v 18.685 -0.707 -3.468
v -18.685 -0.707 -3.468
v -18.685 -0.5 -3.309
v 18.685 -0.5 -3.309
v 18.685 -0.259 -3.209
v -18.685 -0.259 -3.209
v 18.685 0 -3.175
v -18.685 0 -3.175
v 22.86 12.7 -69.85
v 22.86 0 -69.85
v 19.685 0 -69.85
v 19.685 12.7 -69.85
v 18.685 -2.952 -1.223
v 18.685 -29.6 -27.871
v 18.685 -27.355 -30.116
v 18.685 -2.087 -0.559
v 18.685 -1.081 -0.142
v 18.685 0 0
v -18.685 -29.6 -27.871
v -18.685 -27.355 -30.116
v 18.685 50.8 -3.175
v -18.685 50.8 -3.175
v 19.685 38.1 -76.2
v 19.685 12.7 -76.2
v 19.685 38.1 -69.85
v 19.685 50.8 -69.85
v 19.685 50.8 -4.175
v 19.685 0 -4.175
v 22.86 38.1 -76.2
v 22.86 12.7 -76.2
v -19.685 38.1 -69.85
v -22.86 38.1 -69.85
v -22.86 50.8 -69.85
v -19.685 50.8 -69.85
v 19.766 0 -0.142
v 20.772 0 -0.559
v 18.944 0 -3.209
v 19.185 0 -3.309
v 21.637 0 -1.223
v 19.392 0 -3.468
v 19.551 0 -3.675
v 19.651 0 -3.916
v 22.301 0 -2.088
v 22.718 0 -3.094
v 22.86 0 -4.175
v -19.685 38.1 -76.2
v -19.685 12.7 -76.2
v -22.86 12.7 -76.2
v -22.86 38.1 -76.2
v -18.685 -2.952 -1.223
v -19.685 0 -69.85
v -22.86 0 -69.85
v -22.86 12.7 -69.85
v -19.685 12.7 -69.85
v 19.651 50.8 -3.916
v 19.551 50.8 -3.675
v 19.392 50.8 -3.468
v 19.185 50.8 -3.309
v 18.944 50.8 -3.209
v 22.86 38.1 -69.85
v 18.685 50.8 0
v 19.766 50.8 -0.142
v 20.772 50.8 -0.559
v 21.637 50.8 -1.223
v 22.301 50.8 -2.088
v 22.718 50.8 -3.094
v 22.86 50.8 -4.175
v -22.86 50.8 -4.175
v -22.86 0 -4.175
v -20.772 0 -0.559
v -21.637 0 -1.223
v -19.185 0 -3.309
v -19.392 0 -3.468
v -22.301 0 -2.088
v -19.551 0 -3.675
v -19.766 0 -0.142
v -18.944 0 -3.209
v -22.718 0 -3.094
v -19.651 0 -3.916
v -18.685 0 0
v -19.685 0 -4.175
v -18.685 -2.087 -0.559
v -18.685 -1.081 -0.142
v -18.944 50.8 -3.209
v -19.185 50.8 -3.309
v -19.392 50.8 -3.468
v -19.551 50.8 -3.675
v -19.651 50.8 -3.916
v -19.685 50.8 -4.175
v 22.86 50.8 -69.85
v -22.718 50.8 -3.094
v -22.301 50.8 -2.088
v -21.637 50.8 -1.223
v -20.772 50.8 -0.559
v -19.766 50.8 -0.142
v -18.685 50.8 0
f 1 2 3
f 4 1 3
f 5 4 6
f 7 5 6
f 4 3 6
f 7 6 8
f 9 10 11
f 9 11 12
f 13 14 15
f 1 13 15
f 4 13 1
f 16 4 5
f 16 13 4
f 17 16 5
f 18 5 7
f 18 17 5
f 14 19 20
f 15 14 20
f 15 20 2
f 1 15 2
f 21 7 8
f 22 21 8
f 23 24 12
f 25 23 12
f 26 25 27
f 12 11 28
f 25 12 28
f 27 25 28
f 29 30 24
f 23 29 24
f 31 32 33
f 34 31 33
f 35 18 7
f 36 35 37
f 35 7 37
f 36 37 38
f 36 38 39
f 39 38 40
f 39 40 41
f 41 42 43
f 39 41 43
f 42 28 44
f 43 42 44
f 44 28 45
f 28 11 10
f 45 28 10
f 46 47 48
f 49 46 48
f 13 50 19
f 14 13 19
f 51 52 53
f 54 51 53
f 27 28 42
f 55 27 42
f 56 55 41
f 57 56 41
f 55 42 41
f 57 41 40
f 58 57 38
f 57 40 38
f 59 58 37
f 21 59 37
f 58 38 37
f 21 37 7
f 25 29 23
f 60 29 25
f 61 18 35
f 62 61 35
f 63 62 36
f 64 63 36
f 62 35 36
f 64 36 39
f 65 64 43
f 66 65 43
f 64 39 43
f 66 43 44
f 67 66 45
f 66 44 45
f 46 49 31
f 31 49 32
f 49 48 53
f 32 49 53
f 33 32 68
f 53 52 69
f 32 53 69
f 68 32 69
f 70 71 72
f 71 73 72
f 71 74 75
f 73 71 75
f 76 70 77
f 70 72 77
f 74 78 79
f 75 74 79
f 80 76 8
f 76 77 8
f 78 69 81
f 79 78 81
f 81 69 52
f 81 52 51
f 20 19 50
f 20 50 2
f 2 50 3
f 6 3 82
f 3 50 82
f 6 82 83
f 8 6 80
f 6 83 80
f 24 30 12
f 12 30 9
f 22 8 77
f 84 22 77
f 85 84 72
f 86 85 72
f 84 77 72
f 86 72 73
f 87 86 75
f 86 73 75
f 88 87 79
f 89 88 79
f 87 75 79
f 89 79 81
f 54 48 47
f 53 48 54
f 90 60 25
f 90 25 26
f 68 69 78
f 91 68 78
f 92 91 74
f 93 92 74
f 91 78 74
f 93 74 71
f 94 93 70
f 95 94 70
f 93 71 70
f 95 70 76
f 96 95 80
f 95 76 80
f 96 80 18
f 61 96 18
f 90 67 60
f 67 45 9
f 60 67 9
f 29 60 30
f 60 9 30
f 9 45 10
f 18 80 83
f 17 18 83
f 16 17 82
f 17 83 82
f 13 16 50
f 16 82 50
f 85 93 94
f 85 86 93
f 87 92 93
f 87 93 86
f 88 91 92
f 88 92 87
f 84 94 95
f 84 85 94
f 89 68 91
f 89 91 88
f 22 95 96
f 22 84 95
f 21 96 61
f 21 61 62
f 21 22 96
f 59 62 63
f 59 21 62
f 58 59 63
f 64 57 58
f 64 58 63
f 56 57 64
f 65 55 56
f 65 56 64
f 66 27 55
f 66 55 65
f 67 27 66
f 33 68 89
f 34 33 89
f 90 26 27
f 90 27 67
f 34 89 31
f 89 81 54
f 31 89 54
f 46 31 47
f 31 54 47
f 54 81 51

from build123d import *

# Parameters (mm, degrees)
BASE_FLANGE1_DEPTH  = 50.8
MITER_START         = -18.685
MITER_FLANGE2_DEPTH = 37.37
SKETCH24_W          = 6.35
SKETCH24_H          = 12.7
CUT_EXTRUDE1_DEPTH  = 3.175


# Read off the part's stored shape, not the designer's step: Miter Flange2
# Sheet-metal steps are written as plain solids
with BuildPart() as part:
    # Sketch1 → Base-Flange1 (new body)
    with BuildSketch(Plane(origin=(0, 0, 0), x_dir=(1, 0, 0), z_dir=(0, 1, 0))):
        with BuildLine():
            Line((-22.86, 76.2), (-22.86, 4.175))
            ThreePointArc((-22.86, 4.175), (-21.637170811, 1.222829189), (-18.685, 0))
            Line((-18.685, 0), (18.685, 0))
            ThreePointArc((18.685, 0), (21.637170811, 1.222829189), (22.86, 4.175))
            Line((22.86, 4.175), (22.86, 76.2))
            Line((22.86, 76.2), (19.685, 76.2))
            Line((19.685, 76.2), (19.685, 4.175))
            ThreePointArc((19.685, 4.175), (19.392106781, 3.467893219), (18.685, 3.175))
            Line((18.685, 3.175), (-18.685, 3.175))
            ThreePointArc((-18.685, 3.175), (-19.392106781, 3.467893219), (-19.685, 4.175))
            Line((-19.685, 4.175), (-19.685, 76.2))
            Line((-19.685, 76.2), (-22.86, 76.2))
        make_face()
    extrude(amount=BASE_FLANGE1_DEPTH)

    # Miter Flange2 outline → Miter Flange2 (add)
    with BuildSketch(Plane.YZ.offset(MITER_START)):
        with BuildLine():
            Line((-29.600045956, -27.870704333), (-27.354981926, -30.115768363))
            Line((-27.354981926, -30.115768363), (-0.707106781, -3.467893219))
            ThreePointArc((-0.707106781, -3.467893219), (-0.382683432, -3.251120467), (0, -3.175))
            Line((0, -3.175), (0, 0))
            ThreePointArc((0, 0), (-1.59770333, -0.317802952), (-2.952170811, -1.222829189))
            Line((-2.952170811, -1.222829189), (-29.600045956, -27.870704333))
        make_face()
    extrude(amount=MITER_FLANGE2_DEPTH)

    # Sketch24 → Cut-Extrude1 (cut)
    with BuildSketch(Plane.ZY.offset(22.86)):
        with Locations((-73.025, 44.45)):
            Rectangle(SKETCH24_W, SKETCH24_H)
        with Locations((-73.025, 6.35)):
            Rectangle(SKETCH24_W, SKETCH24_H)
    cut_extrude1 = extrude(amount=-CUT_EXTRUDE1_DEPTH, mode=Mode.SUBTRACT)

    # Mirror2: Cut-Extrude1 across plane
    add(cut_extrude1.mirror(Plane.ZY), mode=Mode.SUBTRACT)


solid = part.part
